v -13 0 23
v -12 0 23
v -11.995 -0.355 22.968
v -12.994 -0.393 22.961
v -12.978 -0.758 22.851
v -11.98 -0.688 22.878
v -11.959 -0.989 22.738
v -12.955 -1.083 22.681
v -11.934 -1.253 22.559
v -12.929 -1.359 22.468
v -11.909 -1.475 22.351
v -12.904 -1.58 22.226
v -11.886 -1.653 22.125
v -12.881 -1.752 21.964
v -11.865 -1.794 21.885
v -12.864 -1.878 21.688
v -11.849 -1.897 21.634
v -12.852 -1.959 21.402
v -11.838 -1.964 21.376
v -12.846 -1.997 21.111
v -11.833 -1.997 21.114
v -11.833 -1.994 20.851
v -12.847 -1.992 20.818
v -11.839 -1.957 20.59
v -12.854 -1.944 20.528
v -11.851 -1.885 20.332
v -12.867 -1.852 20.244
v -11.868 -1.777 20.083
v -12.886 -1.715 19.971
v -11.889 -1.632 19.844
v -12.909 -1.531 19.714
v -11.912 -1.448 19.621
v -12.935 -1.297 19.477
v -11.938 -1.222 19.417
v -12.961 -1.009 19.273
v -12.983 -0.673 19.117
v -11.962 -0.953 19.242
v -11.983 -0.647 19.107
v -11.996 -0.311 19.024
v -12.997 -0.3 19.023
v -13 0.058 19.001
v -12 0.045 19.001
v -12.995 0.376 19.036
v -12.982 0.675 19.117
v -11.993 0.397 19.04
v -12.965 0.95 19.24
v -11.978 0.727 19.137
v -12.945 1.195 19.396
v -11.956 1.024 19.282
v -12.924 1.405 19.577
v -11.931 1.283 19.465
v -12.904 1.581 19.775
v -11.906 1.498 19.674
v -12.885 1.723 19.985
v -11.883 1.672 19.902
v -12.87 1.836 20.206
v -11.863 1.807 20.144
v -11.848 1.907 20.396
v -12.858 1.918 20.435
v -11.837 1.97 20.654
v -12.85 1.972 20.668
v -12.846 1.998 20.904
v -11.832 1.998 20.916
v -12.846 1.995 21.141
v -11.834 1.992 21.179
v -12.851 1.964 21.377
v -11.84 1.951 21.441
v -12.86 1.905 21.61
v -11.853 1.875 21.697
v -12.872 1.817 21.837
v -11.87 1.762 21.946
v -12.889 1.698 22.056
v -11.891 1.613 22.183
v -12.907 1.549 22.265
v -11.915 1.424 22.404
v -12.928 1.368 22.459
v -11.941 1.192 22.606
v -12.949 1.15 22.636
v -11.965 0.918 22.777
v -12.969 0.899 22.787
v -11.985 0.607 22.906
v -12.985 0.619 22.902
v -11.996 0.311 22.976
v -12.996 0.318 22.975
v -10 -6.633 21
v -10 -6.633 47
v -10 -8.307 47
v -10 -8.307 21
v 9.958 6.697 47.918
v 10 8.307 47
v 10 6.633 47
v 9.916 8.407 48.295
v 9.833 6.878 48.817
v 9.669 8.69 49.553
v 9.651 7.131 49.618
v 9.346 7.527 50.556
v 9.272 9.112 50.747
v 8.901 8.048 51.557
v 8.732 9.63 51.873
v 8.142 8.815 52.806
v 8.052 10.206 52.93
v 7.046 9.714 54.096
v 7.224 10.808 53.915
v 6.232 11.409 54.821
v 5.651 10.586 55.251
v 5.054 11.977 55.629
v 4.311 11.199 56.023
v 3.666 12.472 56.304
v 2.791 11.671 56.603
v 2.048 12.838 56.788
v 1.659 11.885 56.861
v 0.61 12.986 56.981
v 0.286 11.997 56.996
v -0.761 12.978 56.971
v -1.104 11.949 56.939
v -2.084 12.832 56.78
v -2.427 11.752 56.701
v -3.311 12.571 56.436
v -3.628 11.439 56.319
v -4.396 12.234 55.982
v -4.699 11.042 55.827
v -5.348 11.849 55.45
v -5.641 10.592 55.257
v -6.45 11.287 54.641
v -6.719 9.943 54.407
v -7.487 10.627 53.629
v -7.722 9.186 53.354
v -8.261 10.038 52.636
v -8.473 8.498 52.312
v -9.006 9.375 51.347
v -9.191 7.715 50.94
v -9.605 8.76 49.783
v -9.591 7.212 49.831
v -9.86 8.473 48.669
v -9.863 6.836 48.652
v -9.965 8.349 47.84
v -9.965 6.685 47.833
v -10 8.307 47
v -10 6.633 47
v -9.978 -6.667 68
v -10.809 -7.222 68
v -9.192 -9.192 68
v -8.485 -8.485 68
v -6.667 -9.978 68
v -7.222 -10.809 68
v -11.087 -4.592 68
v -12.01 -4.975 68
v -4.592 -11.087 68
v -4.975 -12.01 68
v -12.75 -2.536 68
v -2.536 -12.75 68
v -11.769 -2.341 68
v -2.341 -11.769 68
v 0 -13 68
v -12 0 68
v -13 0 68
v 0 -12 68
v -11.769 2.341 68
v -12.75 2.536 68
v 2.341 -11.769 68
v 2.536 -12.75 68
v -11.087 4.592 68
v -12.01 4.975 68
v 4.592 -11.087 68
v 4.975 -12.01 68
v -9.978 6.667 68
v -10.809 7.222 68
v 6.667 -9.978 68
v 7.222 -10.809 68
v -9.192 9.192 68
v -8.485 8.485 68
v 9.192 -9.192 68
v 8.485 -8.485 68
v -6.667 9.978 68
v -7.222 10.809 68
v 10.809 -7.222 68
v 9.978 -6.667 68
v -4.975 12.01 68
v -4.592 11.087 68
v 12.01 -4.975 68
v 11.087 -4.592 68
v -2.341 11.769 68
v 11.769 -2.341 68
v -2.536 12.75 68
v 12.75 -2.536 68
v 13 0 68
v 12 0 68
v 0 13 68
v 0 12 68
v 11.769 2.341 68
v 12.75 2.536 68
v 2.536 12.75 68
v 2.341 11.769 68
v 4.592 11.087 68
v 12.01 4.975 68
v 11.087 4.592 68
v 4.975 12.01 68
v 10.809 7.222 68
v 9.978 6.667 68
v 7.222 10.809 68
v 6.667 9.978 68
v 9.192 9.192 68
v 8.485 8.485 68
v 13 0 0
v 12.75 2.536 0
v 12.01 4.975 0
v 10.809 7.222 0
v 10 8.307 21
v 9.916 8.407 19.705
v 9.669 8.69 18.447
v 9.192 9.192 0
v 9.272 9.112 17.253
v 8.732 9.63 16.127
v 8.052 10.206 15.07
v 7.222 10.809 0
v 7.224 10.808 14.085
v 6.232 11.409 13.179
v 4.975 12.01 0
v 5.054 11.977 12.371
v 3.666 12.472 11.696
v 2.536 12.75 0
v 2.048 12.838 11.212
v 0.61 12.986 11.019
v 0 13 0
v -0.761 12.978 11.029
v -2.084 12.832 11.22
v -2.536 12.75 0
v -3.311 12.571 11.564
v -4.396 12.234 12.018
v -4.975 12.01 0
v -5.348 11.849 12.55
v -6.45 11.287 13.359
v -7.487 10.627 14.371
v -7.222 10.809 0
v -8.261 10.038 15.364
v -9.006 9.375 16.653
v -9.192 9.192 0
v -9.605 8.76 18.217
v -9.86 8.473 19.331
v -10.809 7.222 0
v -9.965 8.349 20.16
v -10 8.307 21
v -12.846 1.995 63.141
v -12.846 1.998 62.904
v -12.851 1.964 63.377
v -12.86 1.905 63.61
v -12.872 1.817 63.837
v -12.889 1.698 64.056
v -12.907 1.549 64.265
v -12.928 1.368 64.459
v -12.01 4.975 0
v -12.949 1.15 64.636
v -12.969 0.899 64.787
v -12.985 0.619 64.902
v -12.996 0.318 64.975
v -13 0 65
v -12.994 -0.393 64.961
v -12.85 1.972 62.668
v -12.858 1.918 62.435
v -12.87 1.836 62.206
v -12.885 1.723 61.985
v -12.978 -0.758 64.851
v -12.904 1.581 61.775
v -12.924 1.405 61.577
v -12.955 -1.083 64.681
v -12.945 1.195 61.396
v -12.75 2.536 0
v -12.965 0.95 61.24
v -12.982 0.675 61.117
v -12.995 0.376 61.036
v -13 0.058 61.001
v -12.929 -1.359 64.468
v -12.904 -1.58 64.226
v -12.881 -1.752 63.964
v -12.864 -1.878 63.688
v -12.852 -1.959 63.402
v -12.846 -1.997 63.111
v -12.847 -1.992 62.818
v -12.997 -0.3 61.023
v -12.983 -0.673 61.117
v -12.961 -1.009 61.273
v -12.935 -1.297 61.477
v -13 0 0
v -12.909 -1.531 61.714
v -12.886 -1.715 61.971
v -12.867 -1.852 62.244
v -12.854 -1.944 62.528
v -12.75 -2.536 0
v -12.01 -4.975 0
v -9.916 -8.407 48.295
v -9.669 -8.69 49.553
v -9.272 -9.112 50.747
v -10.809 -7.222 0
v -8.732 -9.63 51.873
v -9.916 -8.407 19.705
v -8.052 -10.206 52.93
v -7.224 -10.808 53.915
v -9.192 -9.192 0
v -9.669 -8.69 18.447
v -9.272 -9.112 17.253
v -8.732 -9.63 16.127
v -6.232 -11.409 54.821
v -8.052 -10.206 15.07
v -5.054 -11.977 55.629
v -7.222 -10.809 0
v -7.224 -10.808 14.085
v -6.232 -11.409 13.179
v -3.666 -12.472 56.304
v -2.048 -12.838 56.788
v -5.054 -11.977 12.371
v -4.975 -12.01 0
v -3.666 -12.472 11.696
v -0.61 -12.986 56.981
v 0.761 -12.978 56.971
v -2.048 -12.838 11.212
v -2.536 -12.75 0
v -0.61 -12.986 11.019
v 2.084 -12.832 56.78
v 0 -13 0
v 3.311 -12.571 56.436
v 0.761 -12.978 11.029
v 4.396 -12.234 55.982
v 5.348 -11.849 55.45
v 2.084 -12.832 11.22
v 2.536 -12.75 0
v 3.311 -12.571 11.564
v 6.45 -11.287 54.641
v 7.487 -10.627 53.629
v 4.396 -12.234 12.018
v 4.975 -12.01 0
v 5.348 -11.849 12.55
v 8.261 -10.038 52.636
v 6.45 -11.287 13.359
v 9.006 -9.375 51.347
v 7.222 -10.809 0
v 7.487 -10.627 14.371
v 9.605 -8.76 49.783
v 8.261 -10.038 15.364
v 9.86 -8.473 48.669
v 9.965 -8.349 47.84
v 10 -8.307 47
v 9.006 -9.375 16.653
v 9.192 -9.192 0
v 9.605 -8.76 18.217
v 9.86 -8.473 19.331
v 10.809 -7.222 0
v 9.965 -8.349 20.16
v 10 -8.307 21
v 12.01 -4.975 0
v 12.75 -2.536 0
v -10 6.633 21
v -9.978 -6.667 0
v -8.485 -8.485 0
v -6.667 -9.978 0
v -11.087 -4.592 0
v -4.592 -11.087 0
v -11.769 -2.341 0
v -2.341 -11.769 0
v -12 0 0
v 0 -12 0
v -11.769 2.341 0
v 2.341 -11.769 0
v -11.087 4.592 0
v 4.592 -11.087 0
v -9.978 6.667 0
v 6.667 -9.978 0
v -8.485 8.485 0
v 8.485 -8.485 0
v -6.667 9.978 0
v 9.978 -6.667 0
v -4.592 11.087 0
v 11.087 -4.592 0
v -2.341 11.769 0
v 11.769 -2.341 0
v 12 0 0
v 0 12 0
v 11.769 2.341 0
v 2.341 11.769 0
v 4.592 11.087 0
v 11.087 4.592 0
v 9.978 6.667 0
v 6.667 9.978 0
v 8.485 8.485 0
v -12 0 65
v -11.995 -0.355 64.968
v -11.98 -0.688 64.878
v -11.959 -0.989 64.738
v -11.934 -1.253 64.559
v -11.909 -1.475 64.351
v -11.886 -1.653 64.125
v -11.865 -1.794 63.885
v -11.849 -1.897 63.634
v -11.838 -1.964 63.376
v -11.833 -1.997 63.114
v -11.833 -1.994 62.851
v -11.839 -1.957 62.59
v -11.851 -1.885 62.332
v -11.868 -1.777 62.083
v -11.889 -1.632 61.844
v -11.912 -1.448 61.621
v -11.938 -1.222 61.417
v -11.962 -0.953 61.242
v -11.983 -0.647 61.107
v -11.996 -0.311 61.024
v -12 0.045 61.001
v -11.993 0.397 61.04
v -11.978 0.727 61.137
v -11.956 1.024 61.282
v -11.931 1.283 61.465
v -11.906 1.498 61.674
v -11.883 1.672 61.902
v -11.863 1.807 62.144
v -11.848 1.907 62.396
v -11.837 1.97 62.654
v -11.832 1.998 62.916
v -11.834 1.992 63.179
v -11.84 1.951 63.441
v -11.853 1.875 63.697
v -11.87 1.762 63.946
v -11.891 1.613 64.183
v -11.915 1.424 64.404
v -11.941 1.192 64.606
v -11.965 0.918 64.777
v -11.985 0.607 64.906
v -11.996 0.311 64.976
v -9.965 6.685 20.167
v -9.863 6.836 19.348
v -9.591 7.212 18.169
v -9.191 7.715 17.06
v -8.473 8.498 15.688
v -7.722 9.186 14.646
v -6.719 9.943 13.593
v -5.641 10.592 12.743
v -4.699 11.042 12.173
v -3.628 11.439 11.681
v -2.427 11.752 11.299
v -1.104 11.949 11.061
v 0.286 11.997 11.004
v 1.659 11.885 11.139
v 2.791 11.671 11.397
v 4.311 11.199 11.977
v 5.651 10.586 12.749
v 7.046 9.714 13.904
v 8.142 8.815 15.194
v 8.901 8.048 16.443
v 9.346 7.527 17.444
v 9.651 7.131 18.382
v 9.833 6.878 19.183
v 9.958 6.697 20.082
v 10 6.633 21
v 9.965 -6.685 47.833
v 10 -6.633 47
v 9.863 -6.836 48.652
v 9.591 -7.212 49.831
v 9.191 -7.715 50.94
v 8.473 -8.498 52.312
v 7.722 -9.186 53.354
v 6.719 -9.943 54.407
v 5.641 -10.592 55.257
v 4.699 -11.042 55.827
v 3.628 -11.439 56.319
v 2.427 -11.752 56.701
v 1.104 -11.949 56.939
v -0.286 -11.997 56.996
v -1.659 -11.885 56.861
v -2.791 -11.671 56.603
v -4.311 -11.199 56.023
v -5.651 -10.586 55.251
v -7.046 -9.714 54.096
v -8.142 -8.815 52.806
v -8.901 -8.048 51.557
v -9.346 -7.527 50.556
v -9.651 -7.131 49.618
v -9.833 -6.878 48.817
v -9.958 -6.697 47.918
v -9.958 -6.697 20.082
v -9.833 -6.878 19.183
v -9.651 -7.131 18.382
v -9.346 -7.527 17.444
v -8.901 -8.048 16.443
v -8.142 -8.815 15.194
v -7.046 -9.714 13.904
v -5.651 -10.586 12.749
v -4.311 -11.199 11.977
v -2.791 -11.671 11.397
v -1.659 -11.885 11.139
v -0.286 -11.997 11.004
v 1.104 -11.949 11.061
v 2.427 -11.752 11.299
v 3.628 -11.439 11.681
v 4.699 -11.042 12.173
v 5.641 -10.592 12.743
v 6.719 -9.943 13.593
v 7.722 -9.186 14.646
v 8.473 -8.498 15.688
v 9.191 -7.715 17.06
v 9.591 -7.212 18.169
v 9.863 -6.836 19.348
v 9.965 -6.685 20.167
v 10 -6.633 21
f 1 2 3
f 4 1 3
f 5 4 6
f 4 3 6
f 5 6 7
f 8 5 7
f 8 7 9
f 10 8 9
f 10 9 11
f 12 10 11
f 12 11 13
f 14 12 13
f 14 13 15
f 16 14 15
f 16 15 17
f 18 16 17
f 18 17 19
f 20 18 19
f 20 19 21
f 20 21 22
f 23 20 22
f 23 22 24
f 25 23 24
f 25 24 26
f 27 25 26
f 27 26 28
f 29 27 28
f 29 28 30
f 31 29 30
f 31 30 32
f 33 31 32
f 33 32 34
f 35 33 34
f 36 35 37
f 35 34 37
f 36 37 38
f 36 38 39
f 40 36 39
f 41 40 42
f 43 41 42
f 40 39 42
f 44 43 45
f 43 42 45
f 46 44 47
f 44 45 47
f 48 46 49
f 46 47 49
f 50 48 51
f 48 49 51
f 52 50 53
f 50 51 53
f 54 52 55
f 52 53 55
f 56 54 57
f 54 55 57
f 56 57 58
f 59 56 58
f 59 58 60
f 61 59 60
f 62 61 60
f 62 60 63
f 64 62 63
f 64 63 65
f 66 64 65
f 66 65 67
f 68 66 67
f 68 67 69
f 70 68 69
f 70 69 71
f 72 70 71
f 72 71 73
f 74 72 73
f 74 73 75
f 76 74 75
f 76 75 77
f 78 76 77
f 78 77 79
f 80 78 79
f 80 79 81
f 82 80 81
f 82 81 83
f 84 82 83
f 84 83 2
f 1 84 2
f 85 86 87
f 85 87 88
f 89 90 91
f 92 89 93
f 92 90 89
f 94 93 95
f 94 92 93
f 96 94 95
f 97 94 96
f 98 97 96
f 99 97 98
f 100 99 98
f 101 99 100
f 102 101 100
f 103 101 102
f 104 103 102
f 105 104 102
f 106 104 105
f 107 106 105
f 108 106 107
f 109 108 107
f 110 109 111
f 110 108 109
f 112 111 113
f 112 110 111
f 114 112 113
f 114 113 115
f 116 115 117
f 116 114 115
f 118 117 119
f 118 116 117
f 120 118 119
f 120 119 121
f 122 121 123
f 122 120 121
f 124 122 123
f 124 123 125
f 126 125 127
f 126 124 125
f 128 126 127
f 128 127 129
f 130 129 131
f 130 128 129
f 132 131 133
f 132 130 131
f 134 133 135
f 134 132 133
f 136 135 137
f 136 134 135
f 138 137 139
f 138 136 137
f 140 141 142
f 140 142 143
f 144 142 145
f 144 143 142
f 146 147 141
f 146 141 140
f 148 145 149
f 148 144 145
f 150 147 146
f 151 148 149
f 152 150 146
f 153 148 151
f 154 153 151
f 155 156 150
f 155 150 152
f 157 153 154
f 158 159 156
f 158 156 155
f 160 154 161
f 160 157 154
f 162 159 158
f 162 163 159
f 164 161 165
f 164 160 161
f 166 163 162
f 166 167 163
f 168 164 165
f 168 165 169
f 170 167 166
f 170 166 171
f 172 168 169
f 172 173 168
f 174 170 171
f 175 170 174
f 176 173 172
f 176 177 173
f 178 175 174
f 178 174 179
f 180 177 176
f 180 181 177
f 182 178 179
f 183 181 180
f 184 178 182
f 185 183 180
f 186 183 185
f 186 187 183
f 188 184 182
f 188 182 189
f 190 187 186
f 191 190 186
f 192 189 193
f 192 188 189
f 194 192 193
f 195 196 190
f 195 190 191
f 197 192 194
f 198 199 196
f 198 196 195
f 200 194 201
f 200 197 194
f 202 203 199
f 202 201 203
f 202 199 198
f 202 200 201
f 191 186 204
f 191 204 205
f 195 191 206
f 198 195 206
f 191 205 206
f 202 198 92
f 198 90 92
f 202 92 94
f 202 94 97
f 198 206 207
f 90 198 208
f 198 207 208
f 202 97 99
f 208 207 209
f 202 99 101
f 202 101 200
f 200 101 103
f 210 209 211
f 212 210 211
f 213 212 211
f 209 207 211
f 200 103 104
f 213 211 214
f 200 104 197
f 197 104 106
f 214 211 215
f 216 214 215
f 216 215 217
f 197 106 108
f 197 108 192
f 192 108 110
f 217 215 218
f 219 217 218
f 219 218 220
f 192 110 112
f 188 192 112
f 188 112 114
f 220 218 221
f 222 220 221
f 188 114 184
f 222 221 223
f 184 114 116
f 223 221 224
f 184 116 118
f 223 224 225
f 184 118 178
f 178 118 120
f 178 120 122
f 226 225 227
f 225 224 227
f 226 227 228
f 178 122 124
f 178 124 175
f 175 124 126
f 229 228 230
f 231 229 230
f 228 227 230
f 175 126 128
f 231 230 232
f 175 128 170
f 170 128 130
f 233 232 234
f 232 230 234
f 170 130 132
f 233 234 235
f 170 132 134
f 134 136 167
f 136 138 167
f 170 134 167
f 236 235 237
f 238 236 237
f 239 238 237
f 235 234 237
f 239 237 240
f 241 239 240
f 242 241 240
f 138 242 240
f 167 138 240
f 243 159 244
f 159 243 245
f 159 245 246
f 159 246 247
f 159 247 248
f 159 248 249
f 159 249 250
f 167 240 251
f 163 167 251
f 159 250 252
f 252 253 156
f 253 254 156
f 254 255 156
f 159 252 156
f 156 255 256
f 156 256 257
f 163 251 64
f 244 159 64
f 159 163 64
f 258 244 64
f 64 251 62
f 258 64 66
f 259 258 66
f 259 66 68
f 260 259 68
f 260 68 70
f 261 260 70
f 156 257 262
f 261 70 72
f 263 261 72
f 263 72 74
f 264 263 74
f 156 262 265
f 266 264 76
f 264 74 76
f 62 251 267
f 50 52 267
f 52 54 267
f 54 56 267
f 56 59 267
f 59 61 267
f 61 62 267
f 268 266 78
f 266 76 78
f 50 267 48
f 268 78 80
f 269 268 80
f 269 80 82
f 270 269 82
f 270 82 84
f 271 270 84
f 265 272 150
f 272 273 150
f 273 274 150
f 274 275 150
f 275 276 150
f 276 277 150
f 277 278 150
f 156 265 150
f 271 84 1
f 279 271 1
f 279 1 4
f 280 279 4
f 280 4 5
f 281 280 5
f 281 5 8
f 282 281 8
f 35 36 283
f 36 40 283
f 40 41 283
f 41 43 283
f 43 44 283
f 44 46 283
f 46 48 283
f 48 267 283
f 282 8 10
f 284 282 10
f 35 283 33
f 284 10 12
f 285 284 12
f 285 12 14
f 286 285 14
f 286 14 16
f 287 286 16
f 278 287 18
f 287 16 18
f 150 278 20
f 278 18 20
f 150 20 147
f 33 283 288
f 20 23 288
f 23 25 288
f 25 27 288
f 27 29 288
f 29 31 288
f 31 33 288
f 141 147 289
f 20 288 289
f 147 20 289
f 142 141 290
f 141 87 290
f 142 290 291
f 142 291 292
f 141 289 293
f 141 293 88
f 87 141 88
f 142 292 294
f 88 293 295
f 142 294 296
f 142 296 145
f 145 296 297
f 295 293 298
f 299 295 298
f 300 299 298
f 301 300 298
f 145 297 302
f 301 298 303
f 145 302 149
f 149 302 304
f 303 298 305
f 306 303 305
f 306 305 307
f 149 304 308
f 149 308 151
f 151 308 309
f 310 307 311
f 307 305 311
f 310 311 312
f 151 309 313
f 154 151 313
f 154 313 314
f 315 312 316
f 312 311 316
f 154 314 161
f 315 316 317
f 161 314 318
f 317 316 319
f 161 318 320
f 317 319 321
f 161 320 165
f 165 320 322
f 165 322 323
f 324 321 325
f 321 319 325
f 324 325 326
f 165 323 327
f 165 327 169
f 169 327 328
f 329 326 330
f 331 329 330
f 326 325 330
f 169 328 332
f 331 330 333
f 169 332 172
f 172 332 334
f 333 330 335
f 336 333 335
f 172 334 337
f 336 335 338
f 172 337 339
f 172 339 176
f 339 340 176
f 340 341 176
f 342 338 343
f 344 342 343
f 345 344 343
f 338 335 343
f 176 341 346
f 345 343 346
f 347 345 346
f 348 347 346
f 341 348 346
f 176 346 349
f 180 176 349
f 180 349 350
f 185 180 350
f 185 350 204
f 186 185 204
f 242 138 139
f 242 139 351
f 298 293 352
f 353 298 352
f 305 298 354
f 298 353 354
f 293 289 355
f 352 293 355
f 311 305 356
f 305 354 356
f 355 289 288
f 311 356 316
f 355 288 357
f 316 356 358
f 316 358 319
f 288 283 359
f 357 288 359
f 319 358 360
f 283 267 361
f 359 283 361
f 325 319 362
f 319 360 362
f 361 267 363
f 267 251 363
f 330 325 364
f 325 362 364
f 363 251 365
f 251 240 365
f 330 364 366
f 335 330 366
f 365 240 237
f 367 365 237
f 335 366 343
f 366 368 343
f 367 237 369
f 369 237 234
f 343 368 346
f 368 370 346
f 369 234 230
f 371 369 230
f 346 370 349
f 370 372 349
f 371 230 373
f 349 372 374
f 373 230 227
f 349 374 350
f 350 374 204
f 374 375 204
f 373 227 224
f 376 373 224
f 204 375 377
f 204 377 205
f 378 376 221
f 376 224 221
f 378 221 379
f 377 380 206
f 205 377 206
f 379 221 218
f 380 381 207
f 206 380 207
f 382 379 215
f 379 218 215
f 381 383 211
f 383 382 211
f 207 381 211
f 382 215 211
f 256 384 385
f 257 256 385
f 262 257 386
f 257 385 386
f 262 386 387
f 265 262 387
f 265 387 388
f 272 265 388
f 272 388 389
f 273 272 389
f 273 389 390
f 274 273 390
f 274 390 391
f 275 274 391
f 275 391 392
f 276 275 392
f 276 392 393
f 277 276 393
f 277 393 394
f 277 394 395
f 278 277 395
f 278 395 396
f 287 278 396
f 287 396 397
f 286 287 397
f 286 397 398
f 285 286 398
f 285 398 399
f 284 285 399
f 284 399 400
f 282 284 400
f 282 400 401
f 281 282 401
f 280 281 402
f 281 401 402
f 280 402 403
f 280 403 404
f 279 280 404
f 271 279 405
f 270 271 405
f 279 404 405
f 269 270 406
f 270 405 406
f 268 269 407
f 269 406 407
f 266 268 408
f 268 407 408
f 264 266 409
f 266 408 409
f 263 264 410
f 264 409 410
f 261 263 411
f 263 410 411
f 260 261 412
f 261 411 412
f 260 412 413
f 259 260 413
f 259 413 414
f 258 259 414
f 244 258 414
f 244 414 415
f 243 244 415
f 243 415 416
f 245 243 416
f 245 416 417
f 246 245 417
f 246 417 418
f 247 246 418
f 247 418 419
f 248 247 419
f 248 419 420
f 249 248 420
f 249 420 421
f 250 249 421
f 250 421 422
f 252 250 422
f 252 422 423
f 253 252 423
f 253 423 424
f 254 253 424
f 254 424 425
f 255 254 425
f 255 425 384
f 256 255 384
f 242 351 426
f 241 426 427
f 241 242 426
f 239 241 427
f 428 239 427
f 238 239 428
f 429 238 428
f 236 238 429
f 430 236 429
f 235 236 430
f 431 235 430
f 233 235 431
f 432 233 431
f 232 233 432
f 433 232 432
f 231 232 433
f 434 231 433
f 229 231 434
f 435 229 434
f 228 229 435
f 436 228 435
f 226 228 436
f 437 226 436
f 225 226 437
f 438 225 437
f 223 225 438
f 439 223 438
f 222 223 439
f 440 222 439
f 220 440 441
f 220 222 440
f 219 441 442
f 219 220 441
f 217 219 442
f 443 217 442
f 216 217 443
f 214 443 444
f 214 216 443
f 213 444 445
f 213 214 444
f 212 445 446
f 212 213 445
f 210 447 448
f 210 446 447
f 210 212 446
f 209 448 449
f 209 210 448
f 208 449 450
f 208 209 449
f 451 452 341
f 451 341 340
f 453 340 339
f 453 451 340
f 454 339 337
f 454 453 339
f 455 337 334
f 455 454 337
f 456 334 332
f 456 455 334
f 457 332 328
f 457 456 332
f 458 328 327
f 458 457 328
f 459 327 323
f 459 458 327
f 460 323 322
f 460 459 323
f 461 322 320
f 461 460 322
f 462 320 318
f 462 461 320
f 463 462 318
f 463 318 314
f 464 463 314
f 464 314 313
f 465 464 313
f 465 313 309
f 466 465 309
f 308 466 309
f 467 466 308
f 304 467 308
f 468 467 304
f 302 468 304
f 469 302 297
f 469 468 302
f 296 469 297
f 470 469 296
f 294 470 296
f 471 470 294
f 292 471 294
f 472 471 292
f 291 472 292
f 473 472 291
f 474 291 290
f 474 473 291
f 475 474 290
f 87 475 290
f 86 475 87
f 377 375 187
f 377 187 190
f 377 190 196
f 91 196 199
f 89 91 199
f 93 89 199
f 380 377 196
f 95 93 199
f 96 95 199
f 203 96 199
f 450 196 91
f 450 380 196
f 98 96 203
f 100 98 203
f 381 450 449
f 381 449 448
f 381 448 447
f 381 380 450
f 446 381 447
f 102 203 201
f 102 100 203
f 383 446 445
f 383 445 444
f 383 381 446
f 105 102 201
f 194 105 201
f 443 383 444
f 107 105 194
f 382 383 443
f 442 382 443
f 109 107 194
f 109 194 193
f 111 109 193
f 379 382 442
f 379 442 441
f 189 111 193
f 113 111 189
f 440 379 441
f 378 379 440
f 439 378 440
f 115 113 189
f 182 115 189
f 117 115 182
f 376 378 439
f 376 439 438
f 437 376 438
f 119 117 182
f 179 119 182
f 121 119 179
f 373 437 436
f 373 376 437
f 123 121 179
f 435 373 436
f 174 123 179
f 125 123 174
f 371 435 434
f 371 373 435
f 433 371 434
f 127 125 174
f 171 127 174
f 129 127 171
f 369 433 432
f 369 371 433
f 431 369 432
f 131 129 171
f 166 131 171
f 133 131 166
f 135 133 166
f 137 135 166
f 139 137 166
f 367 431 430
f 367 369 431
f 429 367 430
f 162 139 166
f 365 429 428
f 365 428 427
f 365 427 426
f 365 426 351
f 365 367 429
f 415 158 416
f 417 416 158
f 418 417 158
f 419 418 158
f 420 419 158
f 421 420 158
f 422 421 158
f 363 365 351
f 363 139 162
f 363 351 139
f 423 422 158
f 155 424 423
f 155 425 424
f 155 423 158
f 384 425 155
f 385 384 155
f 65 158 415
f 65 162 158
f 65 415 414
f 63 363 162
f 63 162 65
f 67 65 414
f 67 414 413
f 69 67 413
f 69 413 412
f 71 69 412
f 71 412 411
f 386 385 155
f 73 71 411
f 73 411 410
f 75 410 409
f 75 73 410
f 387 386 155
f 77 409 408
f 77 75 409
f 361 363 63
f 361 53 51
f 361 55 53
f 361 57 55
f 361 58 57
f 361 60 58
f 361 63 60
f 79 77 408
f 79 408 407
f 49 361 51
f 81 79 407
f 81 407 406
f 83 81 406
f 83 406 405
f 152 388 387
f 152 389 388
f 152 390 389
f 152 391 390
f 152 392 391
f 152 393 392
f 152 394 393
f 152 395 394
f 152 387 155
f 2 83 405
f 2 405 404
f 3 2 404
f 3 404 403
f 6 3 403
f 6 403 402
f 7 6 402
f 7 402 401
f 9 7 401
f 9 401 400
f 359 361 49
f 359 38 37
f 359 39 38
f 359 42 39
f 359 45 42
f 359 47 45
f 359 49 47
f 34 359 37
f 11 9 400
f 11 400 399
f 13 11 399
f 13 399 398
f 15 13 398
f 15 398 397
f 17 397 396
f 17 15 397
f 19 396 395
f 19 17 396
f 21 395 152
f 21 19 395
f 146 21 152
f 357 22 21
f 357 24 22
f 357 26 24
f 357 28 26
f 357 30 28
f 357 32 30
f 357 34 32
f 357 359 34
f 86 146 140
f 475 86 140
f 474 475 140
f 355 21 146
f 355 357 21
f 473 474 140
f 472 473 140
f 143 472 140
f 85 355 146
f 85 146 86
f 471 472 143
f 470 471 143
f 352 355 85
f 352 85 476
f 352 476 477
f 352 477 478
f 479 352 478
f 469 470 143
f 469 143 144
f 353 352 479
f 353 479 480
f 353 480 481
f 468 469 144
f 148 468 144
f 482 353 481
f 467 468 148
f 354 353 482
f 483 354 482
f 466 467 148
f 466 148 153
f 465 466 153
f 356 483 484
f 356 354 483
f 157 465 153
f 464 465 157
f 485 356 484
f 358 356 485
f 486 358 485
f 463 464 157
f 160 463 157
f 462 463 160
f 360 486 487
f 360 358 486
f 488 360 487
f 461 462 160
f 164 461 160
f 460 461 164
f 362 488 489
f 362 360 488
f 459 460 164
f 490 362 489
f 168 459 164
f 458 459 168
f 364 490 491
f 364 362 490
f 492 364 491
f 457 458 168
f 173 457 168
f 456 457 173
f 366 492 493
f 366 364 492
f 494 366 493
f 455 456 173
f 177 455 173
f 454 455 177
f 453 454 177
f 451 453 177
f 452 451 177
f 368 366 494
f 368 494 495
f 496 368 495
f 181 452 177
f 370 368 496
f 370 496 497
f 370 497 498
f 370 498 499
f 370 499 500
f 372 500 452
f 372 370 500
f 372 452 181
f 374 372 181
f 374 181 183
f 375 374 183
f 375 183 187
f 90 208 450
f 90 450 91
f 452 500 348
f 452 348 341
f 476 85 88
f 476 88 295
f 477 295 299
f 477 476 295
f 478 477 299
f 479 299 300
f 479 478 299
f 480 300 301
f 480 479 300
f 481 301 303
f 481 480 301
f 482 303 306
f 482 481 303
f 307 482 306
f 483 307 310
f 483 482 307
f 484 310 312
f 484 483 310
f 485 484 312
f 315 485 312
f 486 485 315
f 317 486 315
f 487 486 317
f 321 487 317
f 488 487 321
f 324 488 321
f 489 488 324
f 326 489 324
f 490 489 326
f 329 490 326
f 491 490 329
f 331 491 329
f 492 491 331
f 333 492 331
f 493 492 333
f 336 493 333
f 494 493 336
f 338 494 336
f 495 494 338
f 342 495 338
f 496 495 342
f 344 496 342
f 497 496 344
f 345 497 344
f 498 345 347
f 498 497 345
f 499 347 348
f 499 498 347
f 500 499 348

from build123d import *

# Parameters (mm, degrees)
SKETCH1_R           = 13
SKETCH1_R_2         = 12
BOSS_EXTRUDE1_DEPTH = 68
CUT_EXTRUDE1_DEPTH  = 34
SKETCH3_R           = 2
CUT_EXTRUDE2_DEPTH  = 68


with BuildPart() as part:
    # Sketch1 → Boss-Extrude1 (new body)
    with BuildSketch(Plane.XY):
        Circle(SKETCH1_R)
        Circle(SKETCH1_R_2, mode=Mode.SUBTRACT)
    extrude(amount=BOSS_EXTRUDE1_DEPTH)

    # Sketch2 → Cut-Extrude1 (cut, symmetric)
    with BuildSketch(Plane(origin=(0, 0, 0), x_dir=(1, 0, 0), z_dir=(0, 1, 0))):
        with BuildLine():
            Line((10, -21), (10, -47))
            ThreePointArc((10, -47), (0, -57), (-10, -47))
            Line((-10, -47), (-10, -21))
            ThreePointArc((-10, -21), (0, -11), (10, -21))
        make_face()
    extrude(amount=CUT_EXTRUDE1_DEPTH, both=True, mode=Mode.SUBTRACT)

    # Sketch3 → Cut-Extrude2 (cut)
    with BuildSketch(Plane(origin=(0, 0, 0), x_dir=(0, 0, -1), z_dir=(1, 0, 0))):
        with Locations(Location((-63, 0, 0), (0, 0, 180))):
            Circle(SKETCH3_R)
        with Locations(Location((-21, 0, 0), (0, 0, 180))):
            Circle(SKETCH3_R)
    extrude(amount=-CUT_EXTRUDE2_DEPTH, mode=Mode.SUBTRACT)


solid = part.part
